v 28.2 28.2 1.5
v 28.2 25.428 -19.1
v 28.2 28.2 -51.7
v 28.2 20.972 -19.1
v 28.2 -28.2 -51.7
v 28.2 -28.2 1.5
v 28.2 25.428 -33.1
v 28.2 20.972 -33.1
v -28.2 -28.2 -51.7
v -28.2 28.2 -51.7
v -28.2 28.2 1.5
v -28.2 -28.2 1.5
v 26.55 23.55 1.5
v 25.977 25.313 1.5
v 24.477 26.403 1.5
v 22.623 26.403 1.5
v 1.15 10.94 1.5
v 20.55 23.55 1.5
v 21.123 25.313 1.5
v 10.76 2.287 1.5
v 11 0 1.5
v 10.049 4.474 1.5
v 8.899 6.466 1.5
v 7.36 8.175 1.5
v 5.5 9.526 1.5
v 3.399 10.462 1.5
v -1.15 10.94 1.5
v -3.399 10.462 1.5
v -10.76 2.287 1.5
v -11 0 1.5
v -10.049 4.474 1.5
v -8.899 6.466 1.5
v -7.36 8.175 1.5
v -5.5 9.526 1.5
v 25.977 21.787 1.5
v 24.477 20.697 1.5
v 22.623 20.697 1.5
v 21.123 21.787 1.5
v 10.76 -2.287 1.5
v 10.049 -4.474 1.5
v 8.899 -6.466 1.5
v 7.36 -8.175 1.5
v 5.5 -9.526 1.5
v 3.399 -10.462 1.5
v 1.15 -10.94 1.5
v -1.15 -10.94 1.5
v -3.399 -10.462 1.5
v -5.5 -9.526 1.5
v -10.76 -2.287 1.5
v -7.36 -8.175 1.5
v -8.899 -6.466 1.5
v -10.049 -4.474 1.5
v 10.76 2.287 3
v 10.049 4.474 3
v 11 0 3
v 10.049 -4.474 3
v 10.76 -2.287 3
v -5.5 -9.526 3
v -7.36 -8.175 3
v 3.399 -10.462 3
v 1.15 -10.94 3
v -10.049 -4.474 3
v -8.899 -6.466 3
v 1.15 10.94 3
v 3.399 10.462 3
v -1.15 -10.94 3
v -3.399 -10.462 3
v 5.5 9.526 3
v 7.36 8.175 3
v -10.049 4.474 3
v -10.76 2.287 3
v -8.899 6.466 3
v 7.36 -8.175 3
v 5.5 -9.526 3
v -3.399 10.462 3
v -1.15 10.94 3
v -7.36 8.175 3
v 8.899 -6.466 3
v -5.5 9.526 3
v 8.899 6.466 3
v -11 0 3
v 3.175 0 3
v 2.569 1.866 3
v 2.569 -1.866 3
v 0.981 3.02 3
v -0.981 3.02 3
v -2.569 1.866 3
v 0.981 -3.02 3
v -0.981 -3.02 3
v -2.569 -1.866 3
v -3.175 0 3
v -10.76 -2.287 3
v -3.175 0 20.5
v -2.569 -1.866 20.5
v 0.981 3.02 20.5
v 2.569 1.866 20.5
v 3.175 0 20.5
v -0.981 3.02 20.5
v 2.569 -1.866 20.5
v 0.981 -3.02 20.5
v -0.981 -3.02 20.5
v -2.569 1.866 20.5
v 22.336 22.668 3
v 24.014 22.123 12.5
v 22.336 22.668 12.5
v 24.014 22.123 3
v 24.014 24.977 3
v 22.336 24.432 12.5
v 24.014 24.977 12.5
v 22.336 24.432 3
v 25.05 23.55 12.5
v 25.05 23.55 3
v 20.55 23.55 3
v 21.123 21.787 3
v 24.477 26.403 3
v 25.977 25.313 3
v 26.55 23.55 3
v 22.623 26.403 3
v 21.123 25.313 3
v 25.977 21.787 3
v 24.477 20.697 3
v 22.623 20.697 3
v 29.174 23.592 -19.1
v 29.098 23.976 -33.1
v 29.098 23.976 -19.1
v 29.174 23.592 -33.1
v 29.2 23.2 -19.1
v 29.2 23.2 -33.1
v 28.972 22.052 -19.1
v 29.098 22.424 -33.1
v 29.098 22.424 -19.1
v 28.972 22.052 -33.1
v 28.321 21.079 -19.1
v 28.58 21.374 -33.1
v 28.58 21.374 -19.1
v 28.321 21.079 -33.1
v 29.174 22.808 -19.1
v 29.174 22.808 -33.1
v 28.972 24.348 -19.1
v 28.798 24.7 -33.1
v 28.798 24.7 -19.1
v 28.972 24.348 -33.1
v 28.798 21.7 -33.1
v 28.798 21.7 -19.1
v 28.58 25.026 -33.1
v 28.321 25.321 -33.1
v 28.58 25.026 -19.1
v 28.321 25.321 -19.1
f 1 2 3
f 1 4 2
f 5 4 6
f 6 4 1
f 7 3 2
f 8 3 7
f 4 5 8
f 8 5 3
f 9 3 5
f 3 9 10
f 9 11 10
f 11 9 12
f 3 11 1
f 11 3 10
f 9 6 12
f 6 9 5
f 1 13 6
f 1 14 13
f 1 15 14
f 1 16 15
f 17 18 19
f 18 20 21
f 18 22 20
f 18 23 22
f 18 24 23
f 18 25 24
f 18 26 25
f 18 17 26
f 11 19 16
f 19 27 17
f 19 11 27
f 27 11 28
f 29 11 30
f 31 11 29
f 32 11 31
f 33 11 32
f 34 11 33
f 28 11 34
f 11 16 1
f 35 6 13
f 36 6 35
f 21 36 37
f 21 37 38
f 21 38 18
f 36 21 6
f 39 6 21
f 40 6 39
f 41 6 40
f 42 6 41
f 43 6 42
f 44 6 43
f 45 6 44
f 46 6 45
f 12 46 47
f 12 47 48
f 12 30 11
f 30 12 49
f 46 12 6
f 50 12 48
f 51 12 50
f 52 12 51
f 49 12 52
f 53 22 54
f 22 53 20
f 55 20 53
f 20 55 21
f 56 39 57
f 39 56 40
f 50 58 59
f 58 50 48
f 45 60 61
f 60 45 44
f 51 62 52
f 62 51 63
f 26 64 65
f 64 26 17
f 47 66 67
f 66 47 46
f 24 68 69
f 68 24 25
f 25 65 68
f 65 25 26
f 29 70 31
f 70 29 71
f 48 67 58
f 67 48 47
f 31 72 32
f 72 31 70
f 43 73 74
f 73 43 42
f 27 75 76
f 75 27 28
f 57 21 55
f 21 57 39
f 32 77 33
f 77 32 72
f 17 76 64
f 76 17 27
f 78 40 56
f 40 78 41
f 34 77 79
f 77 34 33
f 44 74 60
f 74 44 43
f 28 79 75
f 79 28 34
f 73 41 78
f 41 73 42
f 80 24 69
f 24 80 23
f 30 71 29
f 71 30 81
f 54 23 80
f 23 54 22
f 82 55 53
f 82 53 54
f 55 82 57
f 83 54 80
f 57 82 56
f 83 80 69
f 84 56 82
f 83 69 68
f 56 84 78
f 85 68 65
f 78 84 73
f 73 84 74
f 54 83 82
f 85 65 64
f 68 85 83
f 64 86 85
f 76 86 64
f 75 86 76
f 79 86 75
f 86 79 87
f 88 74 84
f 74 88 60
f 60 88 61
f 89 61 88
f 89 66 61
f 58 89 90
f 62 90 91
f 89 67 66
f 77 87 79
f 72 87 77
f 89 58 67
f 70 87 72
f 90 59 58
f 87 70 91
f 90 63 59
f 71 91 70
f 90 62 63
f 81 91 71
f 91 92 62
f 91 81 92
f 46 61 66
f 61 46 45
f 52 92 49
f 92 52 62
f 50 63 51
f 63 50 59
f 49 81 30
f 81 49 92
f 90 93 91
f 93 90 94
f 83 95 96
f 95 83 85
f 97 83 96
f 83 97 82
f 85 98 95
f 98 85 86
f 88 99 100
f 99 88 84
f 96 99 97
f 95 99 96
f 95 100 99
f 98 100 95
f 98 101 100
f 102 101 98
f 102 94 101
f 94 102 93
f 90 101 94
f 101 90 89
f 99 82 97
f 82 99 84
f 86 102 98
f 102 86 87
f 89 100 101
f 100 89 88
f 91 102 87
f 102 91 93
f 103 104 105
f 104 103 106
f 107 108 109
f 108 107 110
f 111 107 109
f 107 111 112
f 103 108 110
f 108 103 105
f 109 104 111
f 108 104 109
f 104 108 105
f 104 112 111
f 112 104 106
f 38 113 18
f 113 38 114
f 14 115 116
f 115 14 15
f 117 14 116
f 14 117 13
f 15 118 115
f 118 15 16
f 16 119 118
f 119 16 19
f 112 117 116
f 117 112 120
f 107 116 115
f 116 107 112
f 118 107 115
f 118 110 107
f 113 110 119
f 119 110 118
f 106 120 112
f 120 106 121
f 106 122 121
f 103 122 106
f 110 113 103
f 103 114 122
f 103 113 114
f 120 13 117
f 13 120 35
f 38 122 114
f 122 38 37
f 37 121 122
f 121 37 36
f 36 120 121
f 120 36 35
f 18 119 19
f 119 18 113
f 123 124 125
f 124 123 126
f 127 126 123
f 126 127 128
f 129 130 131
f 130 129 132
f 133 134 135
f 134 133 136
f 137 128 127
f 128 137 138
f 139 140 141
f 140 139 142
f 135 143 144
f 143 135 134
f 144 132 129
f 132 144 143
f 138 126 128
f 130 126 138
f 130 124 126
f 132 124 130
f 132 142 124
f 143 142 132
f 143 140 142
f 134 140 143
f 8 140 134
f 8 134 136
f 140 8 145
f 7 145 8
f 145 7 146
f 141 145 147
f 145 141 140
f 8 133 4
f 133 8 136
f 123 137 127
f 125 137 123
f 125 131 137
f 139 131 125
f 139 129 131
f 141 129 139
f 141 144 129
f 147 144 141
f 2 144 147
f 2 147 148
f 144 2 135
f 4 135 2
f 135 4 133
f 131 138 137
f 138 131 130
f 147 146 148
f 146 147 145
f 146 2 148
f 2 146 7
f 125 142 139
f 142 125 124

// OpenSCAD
// Parameters
face_width_mm = 56.4; //[28.2:112.8:0.1]
body_length_mm = 51.2; //[25.6:102.4:0.1]
front_face_thickness_mm = 3.0; //[1.5:6.0:0.1]
body_width_mm = 56.4; //[28.2:112.8:0.1]
shaft_diameter_mm = 6.35; //[3.0:12.7:0.01]
shaft_length_mm = 20.0; //[10.0:40.0:0.1]
shaft_hub_diameter_mm = 22.0; //[11.0:44.0:0.1]
shaft_hub_thickness_mm = 2.5; //[1.0:6.0:0.1]
mounting_hole_spacing_mm = 47.1; //[23.55:94.2:0.1]
mounting_hole_diameter_mm = 3.5; //[2.0:6.0:0.1]
mounting_hole_cut_depth_mm = 6.0; //[3.0:15.0:0.1]
overlap_mm = 1.0; //[0.5:2.0:0.1]
d_plug_length_mm = 18.0; //[9.0:36.0:0.1]
d_plug_width_mm = 12.0; //[6.0:24.0:0.1]
d_plug_rad_mm = 2.0; //[1.0:4.0:0.1]
d_plug_thickness_mm = 3.0; //[1.5:8.0:0.1]
grill_width_mm = 30.0; //[15.0:60.0:0.1]
grill_height_mm = 30.0; //[15.0:60.0:0.1]
grill_hole_diameter_mm = 3.0; //[1.5:6.0:0.1]
grill_gap_mm = 2.0; //[1.0:6.0:0.1]
grill_thickness_mm = 1.5; //[0.8:4.0:0.1]
screw_shank_diameter_mm = 3.0; //[2.0:6.0:0.1]
screw_length_mm = 12.0; //[6.0:30.0:0.1]
screw_head_diameter_mm = 6.0; //[4.0:12.0:0.1]
screw_head_height_mm = 2.5; //[1.5:6.0:0.1]
washer_outer_diameter_mm = 7.0; //[5.0:14.0:0.1]
washer_thickness_mm = 1.0; //[0.5:3.0:0.1]
ttrack_hole_diameter_mm = 5.0; //[3.0:10.0:0.1]
ttrack_pitch_mm = 12.0; //[6.0:24.0:0.1]
rail_hole_diameter_mm = 4.0; //[2.0:8.0:0.1]
rail_pitch_mm = 20.0; //[10.0:40.0:0.1]

// Helper: Z locations (front face centered at Z=0)
z_front_face_center = 0;
z_front_face_back   = z_front_face_center - front_face_thickness_mm/2;
z_front_face_front  = z_front_face_center + front_face_thickness_mm/2;

// D Plug D (attached to back of front face with overlap)
module d_plug_D() {
  color("DimGray")
    translate([0, 0, z_front_face_back - d_plug_thickness_mm/2 + overlap_mm])
      cube([d_plug_length_mm, d_plug_width_mm, d_plug_thickness_mm], center=true);
}

// Grill Hole Positions (kept as geometry, but now attached to back of front face)
module grill_hole_positions() {
  color("Silver") {
    for (x = [-1, 1])
      for (y = [-1, 1])
        translate([
          x * (grill_width_mm/2 - grill_hole_diameter_mm/2),
          y * (grill_height_mm/2 - grill_hole_diameter_mm/2),
          z_front_face_back - grill_thickness_mm/2 + overlap_mm
        ])
          cylinder(r=grill_hole_diameter_mm/2, h=grill_thickness_mm, center=true);
  }
}

// Screw and Washer (attached to front face with overlap)
module screw_and_washer() {
  color("SteelBlue") {
    translate([
      mounting_hole_spacing_mm/2,
      mounting_hole_spacing_mm/2,
      z_front_face_front + screw_length_mm/2 - overlap_mm
    ])
      cylinder(r=screw_shank_diameter_mm/2, h=screw_length_mm, center=true);

    translate([
      mounting_hole_spacing_mm/2,
      mounting_hole_spacing_mm/2,
      z_front_face_front + screw_head_height_mm/2 - overlap_mm
    ])
      cylinder(r=screw_head_diameter_mm/2, h=screw_head_height_mm, center=true);

    translate([
      mounting_hole_spacing_mm/2,
      mounting_hole_spacing_mm/2,
      z_front_face_front + washer_thickness_mm/2 - overlap_mm
    ])
      cylinder(r=washer_outer_diameter_mm/2, h=washer_thickness_mm, center=true);
  }
}

// Ttrack Hole Positions (attached to back of front face)
module ttrack_hole_positions() {
  color("Silver") {
    for (x = [-1, 1])
      translate([x * ttrack_pitch_mm/2, 0, z_front_face_back - grill_thickness_mm/2 + overlap_mm])
        cylinder(r=ttrack_hole_diameter_mm/2, h=grill_thickness_mm, center=true);
  }
}

// Rail Hole Positions (attached to back of front face)
module rail_hole_positions() {
  color("Silver") {
    for (y = [-1, 1])
      translate([0, y * rail_pitch_mm/2, z_front_face_back - grill_thickness_mm/2 + overlap_mm])
        cylinder(r=rail_hole_diameter_mm/2, h=grill_thickness_mm, center=true);
  }
}

// FIX: Add the small blue cylindrical feature and ensure it is physically attached.
// It is placed on the top-right of the motor body and overlaps into the body by overlap_mm.
module side_cyl_feature() {
  // Size chosen to match the "small" feature appearance; kept modest and non-invasive.
  feature_d_mm = 6.0;
  feature_h_mm = 14.0;

  // Attach to +X side near +Y (top view "top-right"), running along Z.
  // Ensure intersection with body by pushing center inside by overlap_mm.
  x_center = body_width_mm/2 - feature_d_mm/2 + overlap_mm; // guarantees overlap into body
  y_center = body_width_mm/2 - feature_d_mm/2 - 2.0;        // near corner but still on the face
  z_center = z_front_face_back - body_length_mm/2 + overlap_mm; // centered on body cube

  color("SteelBlue")
    translate([x_center, y_center, z_center])
      cylinder(d=feature_d_mm, h=feature_h_mm, center=true, $fn=48);
}

// Motor Assembly
module motor_assembly() {
  color("Black") {
    // Motor Body (behind front face, overlapping by overlap_mm)
    translate([0, 0, z_front_face_back - body_length_mm/2 + overlap_mm])
      cube([body_width_mm, body_width_mm, body_length_mm], center=true);

    // Front Face
    translate([0, 0, z_front_face_center])
      cube([face_width_mm, face_width_mm, front_face_thickness_mm], center=true);

    // Shaft Boss / Front Hub (in front of face, overlapping)
    translate([0, 0, z_front_face_front + shaft_hub_thickness_mm/2 - overlap_mm])
      cylinder(r=shaft_hub_diameter_mm/2, h=shaft_hub_thickness_mm, center=true);

    // Shaft (in front of face, overlapping)
    translate([0, 0, z_front_face_front + shaft_length_mm/2 - overlap_mm])
      cylinder(r=shaft_diameter_mm/2, h=shaft_length_mm, center=true);
  }
}

// Assembly (single connected solid via union; all parts overlap/touch)
module assembly() {
  union() {
    motor_assembly();
    side_cyl_feature();      // FIXED: no longer floating; overlaps into motor body
    d_plug_D();
    grill_hole_positions();
    screw_and_washer();
    ttrack_hole_positions();
    rail_hole_positions();
  }
}

assembly();
